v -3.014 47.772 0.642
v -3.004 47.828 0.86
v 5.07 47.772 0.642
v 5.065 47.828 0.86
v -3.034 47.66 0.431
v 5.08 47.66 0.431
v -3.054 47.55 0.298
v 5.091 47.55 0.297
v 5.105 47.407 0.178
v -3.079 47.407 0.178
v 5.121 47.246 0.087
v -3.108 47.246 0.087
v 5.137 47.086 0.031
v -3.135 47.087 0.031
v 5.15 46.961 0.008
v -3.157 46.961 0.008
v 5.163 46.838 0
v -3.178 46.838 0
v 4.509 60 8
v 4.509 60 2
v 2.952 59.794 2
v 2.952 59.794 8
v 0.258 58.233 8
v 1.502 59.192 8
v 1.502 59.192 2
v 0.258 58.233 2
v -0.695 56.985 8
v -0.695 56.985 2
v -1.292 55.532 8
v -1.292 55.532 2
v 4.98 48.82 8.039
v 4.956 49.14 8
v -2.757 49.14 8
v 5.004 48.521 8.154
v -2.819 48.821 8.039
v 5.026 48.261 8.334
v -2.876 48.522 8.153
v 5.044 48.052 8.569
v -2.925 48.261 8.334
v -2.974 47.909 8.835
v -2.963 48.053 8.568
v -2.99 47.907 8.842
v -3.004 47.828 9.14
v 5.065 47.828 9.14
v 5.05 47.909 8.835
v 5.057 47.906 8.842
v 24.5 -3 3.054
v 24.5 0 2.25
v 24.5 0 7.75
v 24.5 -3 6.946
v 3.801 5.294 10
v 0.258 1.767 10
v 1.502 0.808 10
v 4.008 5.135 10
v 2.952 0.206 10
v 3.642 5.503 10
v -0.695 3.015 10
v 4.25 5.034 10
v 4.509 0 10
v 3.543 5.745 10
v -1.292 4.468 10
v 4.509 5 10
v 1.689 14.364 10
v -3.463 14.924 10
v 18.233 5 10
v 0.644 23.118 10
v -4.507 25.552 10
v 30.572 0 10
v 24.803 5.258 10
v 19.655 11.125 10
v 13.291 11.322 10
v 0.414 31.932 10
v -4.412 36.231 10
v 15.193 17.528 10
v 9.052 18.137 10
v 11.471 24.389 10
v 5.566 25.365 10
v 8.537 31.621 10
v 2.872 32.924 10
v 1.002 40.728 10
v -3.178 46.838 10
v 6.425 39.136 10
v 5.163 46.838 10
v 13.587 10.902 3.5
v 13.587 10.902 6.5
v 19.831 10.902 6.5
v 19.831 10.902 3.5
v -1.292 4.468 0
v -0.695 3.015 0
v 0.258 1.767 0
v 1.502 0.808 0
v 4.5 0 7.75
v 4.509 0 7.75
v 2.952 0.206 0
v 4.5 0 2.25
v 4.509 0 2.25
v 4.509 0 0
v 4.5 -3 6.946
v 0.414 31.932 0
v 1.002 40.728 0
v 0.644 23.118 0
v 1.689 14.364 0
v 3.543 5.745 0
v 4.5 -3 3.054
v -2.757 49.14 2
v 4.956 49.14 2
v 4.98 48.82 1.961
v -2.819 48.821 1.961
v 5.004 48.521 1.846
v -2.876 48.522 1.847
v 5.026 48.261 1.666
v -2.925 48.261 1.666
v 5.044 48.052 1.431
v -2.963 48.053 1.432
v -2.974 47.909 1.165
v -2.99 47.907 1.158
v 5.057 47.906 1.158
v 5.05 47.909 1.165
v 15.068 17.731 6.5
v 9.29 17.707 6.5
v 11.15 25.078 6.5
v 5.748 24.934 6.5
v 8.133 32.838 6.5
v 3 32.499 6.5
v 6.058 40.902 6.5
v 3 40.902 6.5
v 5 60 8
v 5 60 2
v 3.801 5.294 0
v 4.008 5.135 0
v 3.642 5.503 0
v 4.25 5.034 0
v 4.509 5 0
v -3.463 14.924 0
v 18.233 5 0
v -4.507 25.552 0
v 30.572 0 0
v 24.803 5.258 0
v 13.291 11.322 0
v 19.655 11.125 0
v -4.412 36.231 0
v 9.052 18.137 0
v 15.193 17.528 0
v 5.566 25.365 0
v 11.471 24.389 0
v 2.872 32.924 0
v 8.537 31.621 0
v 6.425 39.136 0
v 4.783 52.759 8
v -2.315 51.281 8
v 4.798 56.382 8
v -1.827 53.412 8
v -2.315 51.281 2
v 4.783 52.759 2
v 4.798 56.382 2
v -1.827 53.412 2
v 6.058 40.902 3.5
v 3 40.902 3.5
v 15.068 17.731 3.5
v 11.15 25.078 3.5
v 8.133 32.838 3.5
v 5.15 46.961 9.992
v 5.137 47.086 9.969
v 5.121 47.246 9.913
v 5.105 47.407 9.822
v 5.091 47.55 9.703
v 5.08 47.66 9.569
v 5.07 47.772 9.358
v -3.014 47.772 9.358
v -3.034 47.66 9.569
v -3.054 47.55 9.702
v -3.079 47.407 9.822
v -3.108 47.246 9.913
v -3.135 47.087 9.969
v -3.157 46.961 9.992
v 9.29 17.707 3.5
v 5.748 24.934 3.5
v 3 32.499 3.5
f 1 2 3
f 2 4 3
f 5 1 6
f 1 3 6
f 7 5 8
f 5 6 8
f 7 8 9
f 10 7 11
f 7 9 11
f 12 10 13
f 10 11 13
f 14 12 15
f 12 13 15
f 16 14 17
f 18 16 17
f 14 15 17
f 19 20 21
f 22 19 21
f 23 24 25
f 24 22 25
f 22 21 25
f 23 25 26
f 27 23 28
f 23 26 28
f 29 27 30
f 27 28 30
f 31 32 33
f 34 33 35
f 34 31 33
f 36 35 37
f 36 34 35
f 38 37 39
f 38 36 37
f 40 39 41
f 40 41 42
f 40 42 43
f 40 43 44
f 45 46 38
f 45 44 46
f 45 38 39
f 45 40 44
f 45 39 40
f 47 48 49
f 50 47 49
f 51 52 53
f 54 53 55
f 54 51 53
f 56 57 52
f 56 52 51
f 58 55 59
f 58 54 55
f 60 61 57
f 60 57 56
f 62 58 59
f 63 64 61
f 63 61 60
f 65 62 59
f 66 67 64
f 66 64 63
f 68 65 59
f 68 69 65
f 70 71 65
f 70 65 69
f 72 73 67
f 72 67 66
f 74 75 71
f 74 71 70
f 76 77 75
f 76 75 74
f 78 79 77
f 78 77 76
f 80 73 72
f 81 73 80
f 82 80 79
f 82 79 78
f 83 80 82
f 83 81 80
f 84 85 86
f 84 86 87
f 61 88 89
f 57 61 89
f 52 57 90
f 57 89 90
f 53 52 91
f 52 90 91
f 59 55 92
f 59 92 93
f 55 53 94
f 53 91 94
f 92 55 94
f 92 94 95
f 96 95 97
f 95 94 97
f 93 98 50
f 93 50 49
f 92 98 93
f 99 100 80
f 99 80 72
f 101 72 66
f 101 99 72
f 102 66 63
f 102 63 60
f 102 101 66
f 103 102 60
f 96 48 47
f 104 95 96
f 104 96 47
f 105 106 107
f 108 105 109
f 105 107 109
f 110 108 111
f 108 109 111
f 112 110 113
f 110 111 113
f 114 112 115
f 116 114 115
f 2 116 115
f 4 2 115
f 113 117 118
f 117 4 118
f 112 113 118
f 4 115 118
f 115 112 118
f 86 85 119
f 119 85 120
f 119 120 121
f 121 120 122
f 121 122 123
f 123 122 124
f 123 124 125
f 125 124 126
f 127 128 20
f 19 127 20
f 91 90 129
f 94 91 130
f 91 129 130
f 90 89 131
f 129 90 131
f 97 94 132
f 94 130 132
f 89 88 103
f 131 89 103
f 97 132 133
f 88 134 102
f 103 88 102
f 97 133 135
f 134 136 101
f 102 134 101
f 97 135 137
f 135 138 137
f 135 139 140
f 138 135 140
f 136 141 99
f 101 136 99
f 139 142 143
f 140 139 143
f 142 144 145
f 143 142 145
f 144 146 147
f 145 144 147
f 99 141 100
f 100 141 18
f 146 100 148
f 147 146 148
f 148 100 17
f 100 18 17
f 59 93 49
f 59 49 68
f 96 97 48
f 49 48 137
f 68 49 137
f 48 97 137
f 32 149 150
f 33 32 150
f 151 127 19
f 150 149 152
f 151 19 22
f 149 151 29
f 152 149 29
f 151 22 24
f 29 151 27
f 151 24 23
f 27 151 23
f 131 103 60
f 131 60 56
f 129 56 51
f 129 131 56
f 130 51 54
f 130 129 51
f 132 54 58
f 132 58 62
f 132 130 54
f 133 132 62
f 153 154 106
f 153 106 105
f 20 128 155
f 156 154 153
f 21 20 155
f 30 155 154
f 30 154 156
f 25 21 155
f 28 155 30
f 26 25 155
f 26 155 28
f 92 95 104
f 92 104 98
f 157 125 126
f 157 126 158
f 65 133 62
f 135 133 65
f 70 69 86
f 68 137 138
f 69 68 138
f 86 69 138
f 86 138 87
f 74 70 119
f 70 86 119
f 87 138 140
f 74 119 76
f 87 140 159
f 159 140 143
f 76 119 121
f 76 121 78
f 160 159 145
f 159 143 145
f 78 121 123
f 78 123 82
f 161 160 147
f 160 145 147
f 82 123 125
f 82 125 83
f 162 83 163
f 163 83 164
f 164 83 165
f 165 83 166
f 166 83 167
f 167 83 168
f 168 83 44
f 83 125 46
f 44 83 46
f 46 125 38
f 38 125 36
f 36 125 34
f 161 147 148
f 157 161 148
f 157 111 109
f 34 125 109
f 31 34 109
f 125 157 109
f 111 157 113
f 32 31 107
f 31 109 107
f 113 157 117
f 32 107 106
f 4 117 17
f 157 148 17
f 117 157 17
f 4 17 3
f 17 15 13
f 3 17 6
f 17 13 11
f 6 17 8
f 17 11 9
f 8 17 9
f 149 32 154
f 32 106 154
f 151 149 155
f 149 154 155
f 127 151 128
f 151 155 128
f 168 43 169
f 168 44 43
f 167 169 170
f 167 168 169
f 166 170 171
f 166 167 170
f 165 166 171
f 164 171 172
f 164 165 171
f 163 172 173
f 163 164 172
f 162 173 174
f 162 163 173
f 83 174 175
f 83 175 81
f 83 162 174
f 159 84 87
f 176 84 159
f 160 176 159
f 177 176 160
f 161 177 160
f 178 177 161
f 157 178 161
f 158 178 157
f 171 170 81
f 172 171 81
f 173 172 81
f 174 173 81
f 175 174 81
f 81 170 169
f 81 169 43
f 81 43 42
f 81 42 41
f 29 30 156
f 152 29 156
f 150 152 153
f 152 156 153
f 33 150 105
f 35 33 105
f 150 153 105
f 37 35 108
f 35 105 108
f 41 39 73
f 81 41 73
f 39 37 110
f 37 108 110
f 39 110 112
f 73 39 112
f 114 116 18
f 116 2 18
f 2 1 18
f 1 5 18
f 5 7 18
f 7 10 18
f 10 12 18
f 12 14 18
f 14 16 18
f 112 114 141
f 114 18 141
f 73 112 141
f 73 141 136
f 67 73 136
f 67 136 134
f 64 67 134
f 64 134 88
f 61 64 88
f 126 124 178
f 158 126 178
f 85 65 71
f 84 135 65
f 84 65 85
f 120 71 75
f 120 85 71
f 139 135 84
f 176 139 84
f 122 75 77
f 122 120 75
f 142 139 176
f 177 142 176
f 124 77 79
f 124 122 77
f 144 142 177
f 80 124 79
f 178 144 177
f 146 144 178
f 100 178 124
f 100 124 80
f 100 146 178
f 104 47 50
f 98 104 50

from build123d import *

# Parameters (mm, degrees)
BOSS_EXTRU_1_DEPTH      = 10
ENL_V_START             = 3
ESQUISSE3_W             = 3
ESQUISSE3_H             = 30
ENL_V_MAT_EXTRU_2_DEPTH = 66.07803068
BOSS_EXTRU_2_START      = 4.5
BOSS_EXTRU_2_DEPTH      = 20
ENL_V_MAT_EXTRU_3_DEPTH = 2
ENL_V_MAT_EXTRU_3_TAPER = -30
CONG_1_R                = 1.325
CONG_2_R                = 1.325
CONG_VARIABLE1_R        = 1


with BuildPart() as part:
    # Esquisse1 → Boss.-Extru.1 (new body)
    with BuildSketch(Plane.XY):
        with BuildLine():
            Line((4.509378002, 0), (30.57152697, 0))
            ThreePointArc((30.57152697, 0), (10.370789772, 26.839796662), (5, 60))
            Line((5, 60), (4.509378002, 60))
            ThreePointArc((4.509378002, 60), (0.848195772, 58.753498152), (-1.291762986, 55.531914894))
            ThreePointArc((-1.291762986, 55.531914894), (-4.606079858, 30), (-1.291762986, 4.468085106))
            ThreePointArc((-1.291762986, 4.468085106), (0.848195772, 1.246501848), (4.509378002, 0))
        make_face()
        with BuildLine():
            Line((4.509378002, 5), (18.232904672, 5))
            ThreePointArc((18.232904672, 5), (7.212441996, 21.704317491), (1.001630768, 40.728266722))
            ThreePointArc((1.001630768, 40.728266722), (0.643507572, 23.118189348), (3.54252117, 5.744680851))
            ThreePointArc((3.54252117, 5.744680851), (3.899180963, 5.207750308), (4.509378002, 5))
        make_face(mode=Mode.SUBTRACT)
    extrude(amount=BOSS_EXTRU_1_DEPTH)

    # Esquisse3 → Enlèv. mat.-Extru.2 (cut, through all)
    with BuildSketch(Plane(origin=(0, 0, 0), x_dir=(0, 0, -1), z_dir=(1, 0, 0)).offset(ENL_V_START)):
        with Locations((-5, 25.901656599)):
            Rectangle(ESQUISSE3_W, ESQUISSE3_H)
    extrude(amount=ENL_V_MAT_EXTRU_2_DEPTH, mode=Mode.SUBTRACT)


with BuildPart() as boss_extru_2_tool:
    # Esquisse4 → Boss.-Extru.2 (new body)
    with BuildSketch(Plane(origin=(0, 0, 0), x_dir=(0, 0, -1), z_dir=(1, 0, 0)).offset(BOSS_EXTRU_2_START)):
        Polygon((-7.75, 0), (-2.25, 0), (-3.053847577, -3), (-6.946152423, -3), align=None)
    extrude(amount=BOSS_EXTRU_2_DEPTH)


with BuildPart() as part_1:
    add(part.part)


with BuildPart() as part_2:
    # Boss.-Extru.2: joined with boss_extru_2_tool
    add(part_1.part.fuse(boss_extru_2_tool.part, tol=0.00001))

    # Esquisse6 → Enlèv. mat.-Extru.3 (cut)
    with BuildSketch(Plane.XY):
        with BuildLine():
            Line((-2.972740877, 48), (5.048977769, 48))
            ThreePointArc((5.048977769, 48), (4.766869828, 53.998948533), (5, 60))
            Line((5, 60), (4.509378002, 60))
            ThreePointArc((4.509378002, 60), (0.848195772, 58.753498152), (-1.291762986, 55.531914894))
            ThreePointArc((-1.291762986, 55.531914894), (-2.204935767, 51.782179075), (-2.972740877, 48))
        make_face()
    enl_v_mat_extru_3 = extrude(amount=ENL_V_MAT_EXTRU_3_DEPTH, taper=ENL_V_MAT_EXTRU_3_TAPER, mode=Mode.SUBTRACT)

    # Symétrie1: Enlèv. mat.-Extru.3 across plane
    add(enl_v_mat_extru_3.mirror(Plane(origin=(0, 0, 5), x_dir=(1, 0, 0), z_dir=(0, 0, -1))), mode=Mode.SUBTRACT)

    # Congé1
    cong_1_edges = [part_2.edges().sort_by_distance(p)[0] for p in [
        (0.992837273, 46.845299462, 8),
    ]]
    fillet(cong_1_edges, radius=CONG_1_R)

    # Congé2
    cong_2_edges = [part_2.edges().sort_by_distance(p)[0] for p in [
        (0.992837273, 46.845299462, 2),
    ]]
    fillet(cong_2_edges, radius=CONG_2_R)

    # Congé variable1
    cong_variable1_edges = [part_2.edges().sort_by_distance(p)[0] for p in [
        (1.038118446, 48, 0),
        (1.038118446, 48, 10),
    ]]
    fillet(cong_variable1_edges, radius=CONG_VARIABLE1_R)


solid = part_2.part
